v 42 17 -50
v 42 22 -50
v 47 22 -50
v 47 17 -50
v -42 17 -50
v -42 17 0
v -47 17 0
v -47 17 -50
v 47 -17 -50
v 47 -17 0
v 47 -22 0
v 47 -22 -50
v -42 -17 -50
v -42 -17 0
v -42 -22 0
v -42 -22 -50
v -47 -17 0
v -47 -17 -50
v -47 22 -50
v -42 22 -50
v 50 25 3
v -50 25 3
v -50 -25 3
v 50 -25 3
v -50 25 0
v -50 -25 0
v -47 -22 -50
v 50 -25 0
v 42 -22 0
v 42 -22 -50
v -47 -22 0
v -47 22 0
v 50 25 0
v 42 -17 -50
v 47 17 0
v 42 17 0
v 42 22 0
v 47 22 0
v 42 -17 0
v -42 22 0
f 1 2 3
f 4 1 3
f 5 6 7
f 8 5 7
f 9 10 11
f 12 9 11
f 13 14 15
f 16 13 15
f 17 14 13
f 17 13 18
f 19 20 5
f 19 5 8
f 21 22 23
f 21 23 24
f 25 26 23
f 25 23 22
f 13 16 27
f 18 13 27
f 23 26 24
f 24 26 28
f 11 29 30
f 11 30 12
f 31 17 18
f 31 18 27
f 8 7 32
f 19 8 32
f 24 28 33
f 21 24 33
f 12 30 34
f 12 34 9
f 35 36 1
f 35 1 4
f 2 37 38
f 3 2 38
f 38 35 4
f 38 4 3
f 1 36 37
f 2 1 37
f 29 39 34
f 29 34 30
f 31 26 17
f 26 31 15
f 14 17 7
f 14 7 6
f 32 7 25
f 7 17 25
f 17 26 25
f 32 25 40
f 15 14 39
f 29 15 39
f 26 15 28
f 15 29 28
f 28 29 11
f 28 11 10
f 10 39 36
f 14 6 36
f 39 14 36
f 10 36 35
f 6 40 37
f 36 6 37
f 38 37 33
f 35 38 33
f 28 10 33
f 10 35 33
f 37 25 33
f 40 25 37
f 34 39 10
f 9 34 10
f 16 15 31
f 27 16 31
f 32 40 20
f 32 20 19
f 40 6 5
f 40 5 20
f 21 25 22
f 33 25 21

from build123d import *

# Parameters (mm, degrees)
SKETCH_W           = 100
SKETCH_H           = 50
PAD_DEPTH          = 3
SKETCH001_W        = 5
SKETCH001_H        = 5
PAD001_DEPTH       = 50
POLARPATTERN_COUNT = 2


with BuildPart() as part:
    # Sketch → Pad (new body)
    with BuildSketch(Plane.XY):
        Rectangle(SKETCH_W, SKETCH_H)
    extrude(amount=PAD_DEPTH)

    # Sketch001 (on Face5 of Pad) → Pad001 (join)
    with BuildSketch(Plane(origin=(0, 0, 0), x_dir=(1, 0, 0), z_dir=(0, 0, -1))):
        with Locations((44.5, 19.5)):
            Rectangle(SKETCH001_W, SKETCH001_H)
    pad001 = extrude(amount=PAD001_DEPTH)

    # Mirrored: Pad001 across Sketch001 V_Axis
    add(pad001.mirror(Plane(origin=(0, 0, 0), x_dir=(0, 0, -1), z_dir=(1, 0, 0))))

    # PolarPattern: Pad001 ×2 about axis
    polarpattern_axis = Axis((0, 0, 0), (0, 0, -1))
    for i in range(1, POLARPATTERN_COUNT):
        add(pad001.rotate(polarpattern_axis, i * 360 / POLARPATTERN_COUNT))

    # Mirrored001: Pad001 across Sketch001 H_Axis
    add(pad001.mirror(Plane(origin=(0, 0, 0), x_dir=(0, 0, -1), z_dir=(0, -1, 0))))


solid = part.part
